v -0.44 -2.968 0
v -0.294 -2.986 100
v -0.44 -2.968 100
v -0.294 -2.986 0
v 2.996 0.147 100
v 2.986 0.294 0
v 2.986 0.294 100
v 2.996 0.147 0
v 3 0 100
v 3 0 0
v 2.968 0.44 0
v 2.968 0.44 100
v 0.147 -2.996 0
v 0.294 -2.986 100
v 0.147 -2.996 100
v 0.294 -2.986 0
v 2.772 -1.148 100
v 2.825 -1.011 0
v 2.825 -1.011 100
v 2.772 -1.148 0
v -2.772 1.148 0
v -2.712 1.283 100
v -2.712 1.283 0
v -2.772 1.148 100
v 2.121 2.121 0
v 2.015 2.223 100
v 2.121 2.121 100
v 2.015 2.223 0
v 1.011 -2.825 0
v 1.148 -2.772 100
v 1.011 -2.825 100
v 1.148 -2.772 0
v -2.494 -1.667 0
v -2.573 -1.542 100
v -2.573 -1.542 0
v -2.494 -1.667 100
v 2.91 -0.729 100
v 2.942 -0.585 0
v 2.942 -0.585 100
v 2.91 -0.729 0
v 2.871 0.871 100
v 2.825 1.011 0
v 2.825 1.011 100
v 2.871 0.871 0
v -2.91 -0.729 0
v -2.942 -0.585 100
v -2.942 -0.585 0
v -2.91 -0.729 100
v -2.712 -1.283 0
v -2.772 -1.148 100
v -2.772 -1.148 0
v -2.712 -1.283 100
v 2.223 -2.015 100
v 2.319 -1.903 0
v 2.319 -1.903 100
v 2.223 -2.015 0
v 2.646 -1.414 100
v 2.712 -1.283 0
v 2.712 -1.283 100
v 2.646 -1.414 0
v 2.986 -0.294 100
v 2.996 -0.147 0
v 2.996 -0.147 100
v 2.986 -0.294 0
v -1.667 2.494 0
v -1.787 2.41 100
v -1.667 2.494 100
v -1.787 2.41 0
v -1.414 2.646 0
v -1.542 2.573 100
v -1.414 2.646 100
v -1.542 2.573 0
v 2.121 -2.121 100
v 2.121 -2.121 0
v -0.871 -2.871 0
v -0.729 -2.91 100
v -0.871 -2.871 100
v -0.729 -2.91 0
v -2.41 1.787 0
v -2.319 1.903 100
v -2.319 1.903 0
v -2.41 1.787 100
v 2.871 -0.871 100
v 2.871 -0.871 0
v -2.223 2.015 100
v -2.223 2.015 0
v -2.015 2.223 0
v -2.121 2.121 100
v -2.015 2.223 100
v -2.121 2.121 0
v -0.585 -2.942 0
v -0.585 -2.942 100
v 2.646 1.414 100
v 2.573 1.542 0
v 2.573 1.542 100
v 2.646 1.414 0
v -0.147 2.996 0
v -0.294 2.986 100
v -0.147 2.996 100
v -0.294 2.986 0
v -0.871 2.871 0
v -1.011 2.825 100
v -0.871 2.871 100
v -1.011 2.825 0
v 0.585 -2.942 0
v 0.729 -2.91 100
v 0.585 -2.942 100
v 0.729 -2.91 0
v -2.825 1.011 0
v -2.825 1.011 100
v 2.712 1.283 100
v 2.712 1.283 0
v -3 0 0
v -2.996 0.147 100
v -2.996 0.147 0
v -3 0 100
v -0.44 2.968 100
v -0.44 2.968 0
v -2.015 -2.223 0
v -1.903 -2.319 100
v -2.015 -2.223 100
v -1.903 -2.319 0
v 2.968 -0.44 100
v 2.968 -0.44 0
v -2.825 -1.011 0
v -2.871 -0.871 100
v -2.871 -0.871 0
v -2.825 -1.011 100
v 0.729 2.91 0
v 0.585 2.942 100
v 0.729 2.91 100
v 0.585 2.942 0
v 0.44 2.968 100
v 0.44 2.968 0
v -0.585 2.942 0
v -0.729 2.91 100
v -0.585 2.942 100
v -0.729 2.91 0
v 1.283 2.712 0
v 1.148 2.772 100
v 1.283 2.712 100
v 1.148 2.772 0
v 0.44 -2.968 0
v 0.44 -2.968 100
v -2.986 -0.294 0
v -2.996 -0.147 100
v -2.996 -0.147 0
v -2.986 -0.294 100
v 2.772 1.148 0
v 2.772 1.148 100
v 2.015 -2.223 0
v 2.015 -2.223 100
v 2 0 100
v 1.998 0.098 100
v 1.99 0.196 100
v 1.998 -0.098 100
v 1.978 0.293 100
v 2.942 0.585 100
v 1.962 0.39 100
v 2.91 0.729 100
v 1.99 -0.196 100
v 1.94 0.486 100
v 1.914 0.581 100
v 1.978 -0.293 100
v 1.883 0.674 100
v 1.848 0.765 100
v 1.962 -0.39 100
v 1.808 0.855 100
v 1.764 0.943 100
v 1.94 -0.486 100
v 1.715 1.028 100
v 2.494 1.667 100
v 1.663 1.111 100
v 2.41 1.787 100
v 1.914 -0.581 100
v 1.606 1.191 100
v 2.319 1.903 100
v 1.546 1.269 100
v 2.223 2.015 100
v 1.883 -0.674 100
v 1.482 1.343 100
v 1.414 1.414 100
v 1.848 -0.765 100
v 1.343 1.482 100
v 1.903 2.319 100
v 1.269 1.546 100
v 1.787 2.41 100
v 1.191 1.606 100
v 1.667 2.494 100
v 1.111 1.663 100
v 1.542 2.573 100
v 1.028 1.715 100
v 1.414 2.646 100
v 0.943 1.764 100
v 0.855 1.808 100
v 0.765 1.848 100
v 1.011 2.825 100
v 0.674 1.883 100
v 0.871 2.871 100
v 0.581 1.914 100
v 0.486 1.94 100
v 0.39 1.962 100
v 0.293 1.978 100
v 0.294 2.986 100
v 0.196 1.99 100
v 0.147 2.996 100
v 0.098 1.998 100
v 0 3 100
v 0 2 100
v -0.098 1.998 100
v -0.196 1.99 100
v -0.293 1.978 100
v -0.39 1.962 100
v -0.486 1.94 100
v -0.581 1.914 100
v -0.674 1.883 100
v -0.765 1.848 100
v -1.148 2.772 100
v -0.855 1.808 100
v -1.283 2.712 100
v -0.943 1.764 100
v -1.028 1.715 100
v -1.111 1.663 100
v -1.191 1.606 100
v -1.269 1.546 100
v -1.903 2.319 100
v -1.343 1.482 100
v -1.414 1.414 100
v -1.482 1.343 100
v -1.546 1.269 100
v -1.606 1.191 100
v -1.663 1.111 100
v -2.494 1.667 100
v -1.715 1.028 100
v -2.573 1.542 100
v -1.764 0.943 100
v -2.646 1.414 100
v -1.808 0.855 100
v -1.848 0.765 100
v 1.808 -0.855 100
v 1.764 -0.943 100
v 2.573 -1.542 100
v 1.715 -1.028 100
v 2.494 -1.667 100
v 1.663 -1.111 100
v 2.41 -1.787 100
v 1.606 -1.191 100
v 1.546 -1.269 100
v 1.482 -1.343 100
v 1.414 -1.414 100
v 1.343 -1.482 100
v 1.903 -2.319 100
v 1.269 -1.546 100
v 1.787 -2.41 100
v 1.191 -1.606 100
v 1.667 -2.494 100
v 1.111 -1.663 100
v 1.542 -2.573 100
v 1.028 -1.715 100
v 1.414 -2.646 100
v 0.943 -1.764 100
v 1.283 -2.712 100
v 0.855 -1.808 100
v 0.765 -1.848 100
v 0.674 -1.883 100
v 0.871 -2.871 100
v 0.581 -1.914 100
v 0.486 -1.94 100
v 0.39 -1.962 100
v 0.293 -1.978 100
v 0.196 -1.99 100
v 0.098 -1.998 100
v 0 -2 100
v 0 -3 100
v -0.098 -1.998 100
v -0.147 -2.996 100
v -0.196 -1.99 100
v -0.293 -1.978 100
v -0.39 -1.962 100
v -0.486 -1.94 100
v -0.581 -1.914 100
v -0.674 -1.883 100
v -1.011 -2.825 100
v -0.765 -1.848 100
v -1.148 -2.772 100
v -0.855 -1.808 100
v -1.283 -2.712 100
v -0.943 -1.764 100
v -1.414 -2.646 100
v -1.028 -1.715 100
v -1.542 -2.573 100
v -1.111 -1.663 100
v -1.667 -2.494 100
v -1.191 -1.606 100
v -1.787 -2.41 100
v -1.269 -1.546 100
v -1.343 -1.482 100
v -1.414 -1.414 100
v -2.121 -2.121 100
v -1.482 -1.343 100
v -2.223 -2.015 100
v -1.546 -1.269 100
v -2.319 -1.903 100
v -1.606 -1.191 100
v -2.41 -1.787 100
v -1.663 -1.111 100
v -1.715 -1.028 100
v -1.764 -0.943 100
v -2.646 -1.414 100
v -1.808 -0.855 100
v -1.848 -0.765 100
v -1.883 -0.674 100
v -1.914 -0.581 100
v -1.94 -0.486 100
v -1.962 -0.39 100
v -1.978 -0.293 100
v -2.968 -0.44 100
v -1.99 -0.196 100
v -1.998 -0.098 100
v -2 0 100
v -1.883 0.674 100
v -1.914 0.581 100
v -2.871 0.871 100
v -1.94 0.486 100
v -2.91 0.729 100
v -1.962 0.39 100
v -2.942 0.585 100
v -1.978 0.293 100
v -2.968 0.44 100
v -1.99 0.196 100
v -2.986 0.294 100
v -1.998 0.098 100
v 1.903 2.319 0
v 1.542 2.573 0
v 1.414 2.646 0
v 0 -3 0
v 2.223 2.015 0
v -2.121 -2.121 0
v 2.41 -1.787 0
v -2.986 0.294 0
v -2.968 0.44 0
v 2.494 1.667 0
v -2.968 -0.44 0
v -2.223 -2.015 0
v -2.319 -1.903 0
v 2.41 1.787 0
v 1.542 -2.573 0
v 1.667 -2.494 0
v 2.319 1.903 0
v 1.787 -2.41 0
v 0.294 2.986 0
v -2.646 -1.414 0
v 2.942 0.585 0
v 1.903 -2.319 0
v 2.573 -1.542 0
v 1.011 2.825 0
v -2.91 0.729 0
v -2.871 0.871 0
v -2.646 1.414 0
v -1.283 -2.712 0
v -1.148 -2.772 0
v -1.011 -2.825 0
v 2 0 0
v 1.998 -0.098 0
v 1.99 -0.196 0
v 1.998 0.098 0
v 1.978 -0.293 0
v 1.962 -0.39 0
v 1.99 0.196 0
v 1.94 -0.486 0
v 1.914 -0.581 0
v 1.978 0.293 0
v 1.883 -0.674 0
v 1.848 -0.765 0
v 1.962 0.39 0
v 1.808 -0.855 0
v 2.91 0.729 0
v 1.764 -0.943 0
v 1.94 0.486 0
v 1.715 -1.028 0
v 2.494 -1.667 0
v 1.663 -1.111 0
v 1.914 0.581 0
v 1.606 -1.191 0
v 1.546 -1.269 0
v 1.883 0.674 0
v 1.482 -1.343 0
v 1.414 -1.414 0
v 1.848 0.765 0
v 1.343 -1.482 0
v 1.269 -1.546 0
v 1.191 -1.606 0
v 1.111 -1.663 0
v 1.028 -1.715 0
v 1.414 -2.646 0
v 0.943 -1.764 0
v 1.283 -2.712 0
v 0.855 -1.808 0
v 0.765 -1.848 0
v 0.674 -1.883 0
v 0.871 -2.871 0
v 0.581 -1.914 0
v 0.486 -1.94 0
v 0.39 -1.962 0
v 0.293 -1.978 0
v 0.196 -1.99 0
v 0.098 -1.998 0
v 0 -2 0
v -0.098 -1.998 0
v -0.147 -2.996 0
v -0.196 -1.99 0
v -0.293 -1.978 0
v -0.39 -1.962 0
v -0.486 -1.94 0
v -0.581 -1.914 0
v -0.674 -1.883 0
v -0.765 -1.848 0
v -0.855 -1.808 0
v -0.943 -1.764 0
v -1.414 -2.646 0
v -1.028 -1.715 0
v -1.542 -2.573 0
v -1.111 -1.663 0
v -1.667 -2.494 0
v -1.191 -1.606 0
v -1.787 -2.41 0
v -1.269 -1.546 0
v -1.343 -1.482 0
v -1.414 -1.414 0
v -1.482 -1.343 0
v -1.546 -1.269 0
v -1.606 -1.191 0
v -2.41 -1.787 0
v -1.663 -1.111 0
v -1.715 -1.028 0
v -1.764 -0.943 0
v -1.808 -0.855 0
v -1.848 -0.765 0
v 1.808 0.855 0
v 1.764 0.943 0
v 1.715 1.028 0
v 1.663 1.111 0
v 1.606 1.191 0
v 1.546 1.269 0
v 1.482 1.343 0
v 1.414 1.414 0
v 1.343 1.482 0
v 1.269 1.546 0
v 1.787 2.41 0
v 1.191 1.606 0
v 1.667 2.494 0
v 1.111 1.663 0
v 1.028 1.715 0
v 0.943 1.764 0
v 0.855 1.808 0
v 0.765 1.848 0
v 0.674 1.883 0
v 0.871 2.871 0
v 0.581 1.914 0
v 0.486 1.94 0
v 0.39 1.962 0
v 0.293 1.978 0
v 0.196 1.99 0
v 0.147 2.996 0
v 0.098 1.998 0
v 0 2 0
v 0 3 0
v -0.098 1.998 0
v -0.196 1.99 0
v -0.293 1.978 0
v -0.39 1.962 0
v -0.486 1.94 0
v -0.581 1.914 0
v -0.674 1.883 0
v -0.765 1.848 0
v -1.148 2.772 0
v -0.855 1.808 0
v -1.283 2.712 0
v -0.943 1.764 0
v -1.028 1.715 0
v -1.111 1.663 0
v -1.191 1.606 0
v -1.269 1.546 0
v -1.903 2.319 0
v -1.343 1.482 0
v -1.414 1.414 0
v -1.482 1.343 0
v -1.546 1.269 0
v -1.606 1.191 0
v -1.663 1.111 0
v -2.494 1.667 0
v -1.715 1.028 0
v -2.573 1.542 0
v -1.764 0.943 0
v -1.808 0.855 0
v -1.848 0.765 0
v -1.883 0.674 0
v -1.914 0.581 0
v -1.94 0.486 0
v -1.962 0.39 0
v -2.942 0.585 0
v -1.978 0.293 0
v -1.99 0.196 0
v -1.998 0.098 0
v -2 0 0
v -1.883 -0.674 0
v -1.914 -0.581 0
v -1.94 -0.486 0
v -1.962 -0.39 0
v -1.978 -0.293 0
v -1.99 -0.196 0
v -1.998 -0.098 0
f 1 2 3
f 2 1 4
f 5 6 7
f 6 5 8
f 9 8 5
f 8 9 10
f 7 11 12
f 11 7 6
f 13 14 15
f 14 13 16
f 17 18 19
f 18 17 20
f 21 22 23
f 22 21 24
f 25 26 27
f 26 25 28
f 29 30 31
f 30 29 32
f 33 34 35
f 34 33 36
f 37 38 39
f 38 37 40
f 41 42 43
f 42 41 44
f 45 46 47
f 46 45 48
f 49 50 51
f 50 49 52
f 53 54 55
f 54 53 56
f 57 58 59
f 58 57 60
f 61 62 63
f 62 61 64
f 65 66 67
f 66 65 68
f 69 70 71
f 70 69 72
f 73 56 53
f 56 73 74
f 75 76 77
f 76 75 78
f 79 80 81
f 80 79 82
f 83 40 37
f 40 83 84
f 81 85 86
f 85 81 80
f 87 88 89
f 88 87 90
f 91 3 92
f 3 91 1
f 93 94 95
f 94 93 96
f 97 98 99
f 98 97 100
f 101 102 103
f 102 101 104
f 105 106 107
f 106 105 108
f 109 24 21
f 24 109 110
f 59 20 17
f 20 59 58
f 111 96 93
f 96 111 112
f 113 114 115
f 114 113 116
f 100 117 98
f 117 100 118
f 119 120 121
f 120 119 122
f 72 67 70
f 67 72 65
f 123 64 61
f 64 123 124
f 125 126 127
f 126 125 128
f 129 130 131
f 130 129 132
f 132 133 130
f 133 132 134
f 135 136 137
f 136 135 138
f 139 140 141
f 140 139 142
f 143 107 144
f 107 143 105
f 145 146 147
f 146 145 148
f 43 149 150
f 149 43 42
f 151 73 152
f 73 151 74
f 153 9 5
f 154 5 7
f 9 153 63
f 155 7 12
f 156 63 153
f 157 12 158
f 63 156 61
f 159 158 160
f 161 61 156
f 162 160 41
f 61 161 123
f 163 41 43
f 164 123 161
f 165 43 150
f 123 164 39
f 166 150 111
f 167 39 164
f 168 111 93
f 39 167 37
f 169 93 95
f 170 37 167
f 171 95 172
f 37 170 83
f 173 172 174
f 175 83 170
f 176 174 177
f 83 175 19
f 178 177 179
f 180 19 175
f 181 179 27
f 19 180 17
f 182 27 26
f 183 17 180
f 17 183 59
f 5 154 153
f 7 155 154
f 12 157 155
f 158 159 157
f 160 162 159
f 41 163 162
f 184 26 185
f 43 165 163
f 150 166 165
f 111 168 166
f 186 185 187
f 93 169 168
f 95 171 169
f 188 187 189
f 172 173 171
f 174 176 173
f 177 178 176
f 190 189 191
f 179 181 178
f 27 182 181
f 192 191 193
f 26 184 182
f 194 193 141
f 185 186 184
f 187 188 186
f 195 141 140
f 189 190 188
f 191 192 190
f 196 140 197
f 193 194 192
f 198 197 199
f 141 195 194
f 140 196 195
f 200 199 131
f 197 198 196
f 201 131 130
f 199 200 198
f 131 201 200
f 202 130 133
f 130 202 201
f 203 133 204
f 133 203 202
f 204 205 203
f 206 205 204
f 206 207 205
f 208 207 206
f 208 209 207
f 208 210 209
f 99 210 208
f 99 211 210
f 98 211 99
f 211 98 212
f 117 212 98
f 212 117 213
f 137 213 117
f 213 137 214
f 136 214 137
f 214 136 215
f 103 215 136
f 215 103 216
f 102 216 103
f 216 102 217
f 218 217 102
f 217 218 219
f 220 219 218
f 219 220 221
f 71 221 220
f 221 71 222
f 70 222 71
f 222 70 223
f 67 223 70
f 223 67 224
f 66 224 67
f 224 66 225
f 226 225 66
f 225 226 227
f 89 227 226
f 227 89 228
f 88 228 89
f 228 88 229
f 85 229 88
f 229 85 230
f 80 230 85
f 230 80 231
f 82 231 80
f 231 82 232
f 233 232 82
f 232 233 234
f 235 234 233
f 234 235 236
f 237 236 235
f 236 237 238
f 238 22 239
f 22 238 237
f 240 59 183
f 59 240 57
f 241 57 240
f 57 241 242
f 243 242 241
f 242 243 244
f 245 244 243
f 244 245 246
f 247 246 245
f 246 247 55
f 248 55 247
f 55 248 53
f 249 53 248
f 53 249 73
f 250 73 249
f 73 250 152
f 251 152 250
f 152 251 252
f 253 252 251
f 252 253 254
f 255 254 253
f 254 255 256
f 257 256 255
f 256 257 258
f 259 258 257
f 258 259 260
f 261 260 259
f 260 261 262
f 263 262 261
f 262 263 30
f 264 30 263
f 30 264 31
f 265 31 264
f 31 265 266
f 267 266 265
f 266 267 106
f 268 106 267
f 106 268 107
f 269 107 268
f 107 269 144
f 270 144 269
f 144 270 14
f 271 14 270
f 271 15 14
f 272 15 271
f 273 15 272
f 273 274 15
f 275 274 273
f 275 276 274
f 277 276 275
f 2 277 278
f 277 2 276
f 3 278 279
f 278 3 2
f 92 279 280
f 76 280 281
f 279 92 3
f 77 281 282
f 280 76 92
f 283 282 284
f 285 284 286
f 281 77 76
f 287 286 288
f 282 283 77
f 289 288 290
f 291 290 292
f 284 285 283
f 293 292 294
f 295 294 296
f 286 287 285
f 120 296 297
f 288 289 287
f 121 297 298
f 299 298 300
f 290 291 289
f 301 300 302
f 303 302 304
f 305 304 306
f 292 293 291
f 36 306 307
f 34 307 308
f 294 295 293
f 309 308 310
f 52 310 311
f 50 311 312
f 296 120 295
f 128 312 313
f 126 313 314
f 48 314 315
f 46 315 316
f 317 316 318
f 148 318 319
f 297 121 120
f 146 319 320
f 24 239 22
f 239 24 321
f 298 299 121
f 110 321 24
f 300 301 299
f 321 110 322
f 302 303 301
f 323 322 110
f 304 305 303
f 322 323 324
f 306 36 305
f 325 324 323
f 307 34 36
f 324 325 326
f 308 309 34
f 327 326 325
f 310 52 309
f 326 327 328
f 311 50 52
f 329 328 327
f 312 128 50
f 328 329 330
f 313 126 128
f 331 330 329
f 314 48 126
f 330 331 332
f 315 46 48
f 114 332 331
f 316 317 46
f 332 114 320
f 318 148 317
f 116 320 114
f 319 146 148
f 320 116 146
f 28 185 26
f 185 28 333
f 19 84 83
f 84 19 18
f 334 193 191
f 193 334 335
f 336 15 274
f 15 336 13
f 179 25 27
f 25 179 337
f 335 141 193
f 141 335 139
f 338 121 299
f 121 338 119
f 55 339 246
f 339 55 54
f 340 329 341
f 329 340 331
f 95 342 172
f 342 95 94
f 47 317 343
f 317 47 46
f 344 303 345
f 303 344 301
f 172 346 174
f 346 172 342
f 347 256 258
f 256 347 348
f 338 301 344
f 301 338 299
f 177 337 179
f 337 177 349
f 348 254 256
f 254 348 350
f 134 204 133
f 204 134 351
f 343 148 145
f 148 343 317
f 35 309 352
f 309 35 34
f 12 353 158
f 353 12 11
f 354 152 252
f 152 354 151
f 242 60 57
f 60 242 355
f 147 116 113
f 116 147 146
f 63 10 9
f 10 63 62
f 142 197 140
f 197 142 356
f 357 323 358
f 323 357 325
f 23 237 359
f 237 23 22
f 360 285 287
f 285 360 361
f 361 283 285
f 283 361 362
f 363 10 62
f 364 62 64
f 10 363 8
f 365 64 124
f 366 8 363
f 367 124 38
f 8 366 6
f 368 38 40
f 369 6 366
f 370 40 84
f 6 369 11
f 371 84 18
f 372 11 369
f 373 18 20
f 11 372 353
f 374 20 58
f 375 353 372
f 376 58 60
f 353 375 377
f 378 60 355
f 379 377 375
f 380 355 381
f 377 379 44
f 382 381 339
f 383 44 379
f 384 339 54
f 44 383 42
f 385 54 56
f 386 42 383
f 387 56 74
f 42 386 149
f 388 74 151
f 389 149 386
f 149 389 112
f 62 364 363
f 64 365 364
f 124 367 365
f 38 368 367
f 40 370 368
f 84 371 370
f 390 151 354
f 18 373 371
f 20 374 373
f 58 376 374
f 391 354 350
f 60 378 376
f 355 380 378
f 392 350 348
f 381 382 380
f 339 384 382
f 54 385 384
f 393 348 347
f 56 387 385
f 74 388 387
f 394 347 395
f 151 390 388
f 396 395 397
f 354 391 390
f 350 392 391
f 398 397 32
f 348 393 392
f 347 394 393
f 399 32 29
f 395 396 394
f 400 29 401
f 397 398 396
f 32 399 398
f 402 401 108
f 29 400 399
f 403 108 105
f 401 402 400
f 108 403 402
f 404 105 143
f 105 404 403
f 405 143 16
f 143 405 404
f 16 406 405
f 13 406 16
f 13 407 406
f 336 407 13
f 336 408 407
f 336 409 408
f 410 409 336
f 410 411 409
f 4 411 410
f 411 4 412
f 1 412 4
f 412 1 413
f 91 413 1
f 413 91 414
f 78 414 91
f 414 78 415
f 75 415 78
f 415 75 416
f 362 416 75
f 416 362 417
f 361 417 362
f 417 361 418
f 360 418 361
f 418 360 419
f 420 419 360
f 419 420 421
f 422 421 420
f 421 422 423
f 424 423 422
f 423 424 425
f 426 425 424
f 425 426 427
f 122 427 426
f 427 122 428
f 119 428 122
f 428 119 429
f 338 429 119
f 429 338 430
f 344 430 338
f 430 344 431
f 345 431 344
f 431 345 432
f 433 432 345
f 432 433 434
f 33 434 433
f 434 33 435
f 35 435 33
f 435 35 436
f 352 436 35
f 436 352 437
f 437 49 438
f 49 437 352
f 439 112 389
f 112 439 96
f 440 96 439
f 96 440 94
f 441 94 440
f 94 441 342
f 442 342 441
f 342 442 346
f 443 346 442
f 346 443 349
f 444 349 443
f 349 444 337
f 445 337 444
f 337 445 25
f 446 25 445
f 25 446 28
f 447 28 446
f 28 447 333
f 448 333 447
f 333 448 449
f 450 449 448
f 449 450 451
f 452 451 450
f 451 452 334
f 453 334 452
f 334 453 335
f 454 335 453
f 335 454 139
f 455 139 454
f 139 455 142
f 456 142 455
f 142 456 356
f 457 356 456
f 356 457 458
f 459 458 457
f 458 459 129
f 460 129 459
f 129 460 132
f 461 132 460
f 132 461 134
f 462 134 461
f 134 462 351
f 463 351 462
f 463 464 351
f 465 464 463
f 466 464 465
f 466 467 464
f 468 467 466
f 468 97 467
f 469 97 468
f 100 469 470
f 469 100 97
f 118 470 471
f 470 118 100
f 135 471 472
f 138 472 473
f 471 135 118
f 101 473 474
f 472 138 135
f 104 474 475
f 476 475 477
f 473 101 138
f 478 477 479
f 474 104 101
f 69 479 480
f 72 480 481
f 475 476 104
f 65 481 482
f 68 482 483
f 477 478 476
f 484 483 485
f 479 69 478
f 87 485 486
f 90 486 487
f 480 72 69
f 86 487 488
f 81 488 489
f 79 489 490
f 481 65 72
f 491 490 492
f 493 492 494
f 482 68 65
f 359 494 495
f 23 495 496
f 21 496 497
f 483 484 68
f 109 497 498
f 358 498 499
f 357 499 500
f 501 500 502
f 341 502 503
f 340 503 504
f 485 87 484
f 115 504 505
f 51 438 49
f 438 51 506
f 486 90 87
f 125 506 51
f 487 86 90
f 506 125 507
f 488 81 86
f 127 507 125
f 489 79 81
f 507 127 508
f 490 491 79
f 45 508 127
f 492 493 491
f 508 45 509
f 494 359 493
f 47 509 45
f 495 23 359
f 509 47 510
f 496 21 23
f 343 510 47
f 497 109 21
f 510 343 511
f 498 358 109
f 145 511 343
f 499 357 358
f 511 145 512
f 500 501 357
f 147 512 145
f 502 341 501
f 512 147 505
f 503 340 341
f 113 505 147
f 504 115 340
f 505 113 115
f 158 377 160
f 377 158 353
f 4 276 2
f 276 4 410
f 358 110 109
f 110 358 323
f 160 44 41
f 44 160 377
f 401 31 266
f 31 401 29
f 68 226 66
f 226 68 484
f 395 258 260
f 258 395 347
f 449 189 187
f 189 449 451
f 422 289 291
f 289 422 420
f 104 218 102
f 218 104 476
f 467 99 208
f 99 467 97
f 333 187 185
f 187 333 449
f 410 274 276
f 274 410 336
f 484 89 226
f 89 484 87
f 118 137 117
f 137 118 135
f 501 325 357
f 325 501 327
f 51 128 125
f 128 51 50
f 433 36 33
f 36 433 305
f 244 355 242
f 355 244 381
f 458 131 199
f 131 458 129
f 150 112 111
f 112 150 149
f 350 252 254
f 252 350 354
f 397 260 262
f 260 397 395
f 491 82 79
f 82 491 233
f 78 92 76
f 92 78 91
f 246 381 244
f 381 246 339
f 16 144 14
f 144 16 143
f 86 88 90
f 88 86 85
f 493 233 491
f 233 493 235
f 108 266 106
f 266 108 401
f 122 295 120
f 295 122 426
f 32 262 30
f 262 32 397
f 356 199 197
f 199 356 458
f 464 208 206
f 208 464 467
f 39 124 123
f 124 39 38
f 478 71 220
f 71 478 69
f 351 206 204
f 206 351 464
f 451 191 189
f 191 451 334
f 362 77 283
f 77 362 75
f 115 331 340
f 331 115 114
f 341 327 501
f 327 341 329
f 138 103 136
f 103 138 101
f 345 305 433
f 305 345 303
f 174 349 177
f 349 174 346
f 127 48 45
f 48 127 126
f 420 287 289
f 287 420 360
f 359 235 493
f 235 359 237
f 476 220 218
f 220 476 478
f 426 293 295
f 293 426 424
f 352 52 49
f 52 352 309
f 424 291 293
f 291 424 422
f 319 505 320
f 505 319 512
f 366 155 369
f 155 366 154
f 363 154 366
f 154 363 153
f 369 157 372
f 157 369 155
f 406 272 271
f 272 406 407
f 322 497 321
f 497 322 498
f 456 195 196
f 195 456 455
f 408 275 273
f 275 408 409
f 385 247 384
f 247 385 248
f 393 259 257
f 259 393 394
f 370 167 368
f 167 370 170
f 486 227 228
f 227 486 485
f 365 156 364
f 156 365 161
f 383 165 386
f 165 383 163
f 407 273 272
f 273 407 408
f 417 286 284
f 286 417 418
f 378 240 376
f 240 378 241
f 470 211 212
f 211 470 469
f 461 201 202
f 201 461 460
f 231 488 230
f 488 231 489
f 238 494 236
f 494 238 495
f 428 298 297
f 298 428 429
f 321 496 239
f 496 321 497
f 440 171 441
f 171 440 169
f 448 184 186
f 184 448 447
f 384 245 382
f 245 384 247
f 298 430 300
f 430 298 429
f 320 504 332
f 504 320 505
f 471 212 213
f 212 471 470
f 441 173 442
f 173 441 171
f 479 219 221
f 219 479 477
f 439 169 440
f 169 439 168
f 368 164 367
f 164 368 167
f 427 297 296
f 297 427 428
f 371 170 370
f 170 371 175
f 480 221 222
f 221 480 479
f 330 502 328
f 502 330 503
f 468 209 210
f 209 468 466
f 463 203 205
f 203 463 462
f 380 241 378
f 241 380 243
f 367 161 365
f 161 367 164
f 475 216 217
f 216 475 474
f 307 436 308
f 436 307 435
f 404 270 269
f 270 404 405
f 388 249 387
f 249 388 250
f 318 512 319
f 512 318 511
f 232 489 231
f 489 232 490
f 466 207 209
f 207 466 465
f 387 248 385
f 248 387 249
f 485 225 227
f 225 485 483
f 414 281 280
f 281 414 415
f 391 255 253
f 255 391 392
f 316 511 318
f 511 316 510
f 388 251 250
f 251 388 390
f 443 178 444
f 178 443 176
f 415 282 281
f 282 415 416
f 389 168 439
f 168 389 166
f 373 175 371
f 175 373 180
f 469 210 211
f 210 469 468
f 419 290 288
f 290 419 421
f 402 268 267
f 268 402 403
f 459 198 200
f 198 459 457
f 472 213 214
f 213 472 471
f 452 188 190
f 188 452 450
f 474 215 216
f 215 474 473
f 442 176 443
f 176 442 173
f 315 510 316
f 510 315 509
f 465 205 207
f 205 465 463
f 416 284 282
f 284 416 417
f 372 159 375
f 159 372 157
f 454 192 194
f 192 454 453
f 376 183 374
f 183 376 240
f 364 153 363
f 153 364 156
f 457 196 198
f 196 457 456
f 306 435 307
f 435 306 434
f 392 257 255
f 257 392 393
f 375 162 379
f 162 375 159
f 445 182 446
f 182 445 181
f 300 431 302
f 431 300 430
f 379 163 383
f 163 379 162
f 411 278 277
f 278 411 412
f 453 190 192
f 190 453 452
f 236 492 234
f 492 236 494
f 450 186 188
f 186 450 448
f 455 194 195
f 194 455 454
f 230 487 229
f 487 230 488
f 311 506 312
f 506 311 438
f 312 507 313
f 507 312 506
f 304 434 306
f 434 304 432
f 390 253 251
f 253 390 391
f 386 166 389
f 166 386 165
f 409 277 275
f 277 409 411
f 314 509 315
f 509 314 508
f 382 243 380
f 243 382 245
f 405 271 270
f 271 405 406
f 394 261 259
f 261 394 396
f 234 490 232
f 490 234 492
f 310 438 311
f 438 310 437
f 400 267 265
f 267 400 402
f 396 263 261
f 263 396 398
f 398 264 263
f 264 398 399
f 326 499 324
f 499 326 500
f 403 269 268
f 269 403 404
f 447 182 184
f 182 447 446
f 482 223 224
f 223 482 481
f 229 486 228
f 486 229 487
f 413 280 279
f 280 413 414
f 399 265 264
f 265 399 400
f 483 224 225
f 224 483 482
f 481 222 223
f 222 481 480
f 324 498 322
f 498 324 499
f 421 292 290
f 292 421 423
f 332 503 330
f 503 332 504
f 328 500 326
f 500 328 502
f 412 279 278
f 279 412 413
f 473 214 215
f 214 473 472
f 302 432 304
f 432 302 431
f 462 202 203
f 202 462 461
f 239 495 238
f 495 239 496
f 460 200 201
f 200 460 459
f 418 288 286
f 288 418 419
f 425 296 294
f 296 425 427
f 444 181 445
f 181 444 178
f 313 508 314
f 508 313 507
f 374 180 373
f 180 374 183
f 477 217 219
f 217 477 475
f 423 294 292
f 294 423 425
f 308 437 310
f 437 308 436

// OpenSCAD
$fn = 128;

// PTFE sleeving (simple hollow tube)
inner_d = 4;      // mm
outer_d = 6;      // mm
length  = 100;    // mm

module ptfe_sleeving(id=inner_d, od=outer_d, h=length) {
    difference() {
        cylinder(d=od, h=h, center=false);
        translate([0,0,-0.5])
            cylinder(d=id, h=h+1, center=false);
    }
}

ptfe_sleeving();
